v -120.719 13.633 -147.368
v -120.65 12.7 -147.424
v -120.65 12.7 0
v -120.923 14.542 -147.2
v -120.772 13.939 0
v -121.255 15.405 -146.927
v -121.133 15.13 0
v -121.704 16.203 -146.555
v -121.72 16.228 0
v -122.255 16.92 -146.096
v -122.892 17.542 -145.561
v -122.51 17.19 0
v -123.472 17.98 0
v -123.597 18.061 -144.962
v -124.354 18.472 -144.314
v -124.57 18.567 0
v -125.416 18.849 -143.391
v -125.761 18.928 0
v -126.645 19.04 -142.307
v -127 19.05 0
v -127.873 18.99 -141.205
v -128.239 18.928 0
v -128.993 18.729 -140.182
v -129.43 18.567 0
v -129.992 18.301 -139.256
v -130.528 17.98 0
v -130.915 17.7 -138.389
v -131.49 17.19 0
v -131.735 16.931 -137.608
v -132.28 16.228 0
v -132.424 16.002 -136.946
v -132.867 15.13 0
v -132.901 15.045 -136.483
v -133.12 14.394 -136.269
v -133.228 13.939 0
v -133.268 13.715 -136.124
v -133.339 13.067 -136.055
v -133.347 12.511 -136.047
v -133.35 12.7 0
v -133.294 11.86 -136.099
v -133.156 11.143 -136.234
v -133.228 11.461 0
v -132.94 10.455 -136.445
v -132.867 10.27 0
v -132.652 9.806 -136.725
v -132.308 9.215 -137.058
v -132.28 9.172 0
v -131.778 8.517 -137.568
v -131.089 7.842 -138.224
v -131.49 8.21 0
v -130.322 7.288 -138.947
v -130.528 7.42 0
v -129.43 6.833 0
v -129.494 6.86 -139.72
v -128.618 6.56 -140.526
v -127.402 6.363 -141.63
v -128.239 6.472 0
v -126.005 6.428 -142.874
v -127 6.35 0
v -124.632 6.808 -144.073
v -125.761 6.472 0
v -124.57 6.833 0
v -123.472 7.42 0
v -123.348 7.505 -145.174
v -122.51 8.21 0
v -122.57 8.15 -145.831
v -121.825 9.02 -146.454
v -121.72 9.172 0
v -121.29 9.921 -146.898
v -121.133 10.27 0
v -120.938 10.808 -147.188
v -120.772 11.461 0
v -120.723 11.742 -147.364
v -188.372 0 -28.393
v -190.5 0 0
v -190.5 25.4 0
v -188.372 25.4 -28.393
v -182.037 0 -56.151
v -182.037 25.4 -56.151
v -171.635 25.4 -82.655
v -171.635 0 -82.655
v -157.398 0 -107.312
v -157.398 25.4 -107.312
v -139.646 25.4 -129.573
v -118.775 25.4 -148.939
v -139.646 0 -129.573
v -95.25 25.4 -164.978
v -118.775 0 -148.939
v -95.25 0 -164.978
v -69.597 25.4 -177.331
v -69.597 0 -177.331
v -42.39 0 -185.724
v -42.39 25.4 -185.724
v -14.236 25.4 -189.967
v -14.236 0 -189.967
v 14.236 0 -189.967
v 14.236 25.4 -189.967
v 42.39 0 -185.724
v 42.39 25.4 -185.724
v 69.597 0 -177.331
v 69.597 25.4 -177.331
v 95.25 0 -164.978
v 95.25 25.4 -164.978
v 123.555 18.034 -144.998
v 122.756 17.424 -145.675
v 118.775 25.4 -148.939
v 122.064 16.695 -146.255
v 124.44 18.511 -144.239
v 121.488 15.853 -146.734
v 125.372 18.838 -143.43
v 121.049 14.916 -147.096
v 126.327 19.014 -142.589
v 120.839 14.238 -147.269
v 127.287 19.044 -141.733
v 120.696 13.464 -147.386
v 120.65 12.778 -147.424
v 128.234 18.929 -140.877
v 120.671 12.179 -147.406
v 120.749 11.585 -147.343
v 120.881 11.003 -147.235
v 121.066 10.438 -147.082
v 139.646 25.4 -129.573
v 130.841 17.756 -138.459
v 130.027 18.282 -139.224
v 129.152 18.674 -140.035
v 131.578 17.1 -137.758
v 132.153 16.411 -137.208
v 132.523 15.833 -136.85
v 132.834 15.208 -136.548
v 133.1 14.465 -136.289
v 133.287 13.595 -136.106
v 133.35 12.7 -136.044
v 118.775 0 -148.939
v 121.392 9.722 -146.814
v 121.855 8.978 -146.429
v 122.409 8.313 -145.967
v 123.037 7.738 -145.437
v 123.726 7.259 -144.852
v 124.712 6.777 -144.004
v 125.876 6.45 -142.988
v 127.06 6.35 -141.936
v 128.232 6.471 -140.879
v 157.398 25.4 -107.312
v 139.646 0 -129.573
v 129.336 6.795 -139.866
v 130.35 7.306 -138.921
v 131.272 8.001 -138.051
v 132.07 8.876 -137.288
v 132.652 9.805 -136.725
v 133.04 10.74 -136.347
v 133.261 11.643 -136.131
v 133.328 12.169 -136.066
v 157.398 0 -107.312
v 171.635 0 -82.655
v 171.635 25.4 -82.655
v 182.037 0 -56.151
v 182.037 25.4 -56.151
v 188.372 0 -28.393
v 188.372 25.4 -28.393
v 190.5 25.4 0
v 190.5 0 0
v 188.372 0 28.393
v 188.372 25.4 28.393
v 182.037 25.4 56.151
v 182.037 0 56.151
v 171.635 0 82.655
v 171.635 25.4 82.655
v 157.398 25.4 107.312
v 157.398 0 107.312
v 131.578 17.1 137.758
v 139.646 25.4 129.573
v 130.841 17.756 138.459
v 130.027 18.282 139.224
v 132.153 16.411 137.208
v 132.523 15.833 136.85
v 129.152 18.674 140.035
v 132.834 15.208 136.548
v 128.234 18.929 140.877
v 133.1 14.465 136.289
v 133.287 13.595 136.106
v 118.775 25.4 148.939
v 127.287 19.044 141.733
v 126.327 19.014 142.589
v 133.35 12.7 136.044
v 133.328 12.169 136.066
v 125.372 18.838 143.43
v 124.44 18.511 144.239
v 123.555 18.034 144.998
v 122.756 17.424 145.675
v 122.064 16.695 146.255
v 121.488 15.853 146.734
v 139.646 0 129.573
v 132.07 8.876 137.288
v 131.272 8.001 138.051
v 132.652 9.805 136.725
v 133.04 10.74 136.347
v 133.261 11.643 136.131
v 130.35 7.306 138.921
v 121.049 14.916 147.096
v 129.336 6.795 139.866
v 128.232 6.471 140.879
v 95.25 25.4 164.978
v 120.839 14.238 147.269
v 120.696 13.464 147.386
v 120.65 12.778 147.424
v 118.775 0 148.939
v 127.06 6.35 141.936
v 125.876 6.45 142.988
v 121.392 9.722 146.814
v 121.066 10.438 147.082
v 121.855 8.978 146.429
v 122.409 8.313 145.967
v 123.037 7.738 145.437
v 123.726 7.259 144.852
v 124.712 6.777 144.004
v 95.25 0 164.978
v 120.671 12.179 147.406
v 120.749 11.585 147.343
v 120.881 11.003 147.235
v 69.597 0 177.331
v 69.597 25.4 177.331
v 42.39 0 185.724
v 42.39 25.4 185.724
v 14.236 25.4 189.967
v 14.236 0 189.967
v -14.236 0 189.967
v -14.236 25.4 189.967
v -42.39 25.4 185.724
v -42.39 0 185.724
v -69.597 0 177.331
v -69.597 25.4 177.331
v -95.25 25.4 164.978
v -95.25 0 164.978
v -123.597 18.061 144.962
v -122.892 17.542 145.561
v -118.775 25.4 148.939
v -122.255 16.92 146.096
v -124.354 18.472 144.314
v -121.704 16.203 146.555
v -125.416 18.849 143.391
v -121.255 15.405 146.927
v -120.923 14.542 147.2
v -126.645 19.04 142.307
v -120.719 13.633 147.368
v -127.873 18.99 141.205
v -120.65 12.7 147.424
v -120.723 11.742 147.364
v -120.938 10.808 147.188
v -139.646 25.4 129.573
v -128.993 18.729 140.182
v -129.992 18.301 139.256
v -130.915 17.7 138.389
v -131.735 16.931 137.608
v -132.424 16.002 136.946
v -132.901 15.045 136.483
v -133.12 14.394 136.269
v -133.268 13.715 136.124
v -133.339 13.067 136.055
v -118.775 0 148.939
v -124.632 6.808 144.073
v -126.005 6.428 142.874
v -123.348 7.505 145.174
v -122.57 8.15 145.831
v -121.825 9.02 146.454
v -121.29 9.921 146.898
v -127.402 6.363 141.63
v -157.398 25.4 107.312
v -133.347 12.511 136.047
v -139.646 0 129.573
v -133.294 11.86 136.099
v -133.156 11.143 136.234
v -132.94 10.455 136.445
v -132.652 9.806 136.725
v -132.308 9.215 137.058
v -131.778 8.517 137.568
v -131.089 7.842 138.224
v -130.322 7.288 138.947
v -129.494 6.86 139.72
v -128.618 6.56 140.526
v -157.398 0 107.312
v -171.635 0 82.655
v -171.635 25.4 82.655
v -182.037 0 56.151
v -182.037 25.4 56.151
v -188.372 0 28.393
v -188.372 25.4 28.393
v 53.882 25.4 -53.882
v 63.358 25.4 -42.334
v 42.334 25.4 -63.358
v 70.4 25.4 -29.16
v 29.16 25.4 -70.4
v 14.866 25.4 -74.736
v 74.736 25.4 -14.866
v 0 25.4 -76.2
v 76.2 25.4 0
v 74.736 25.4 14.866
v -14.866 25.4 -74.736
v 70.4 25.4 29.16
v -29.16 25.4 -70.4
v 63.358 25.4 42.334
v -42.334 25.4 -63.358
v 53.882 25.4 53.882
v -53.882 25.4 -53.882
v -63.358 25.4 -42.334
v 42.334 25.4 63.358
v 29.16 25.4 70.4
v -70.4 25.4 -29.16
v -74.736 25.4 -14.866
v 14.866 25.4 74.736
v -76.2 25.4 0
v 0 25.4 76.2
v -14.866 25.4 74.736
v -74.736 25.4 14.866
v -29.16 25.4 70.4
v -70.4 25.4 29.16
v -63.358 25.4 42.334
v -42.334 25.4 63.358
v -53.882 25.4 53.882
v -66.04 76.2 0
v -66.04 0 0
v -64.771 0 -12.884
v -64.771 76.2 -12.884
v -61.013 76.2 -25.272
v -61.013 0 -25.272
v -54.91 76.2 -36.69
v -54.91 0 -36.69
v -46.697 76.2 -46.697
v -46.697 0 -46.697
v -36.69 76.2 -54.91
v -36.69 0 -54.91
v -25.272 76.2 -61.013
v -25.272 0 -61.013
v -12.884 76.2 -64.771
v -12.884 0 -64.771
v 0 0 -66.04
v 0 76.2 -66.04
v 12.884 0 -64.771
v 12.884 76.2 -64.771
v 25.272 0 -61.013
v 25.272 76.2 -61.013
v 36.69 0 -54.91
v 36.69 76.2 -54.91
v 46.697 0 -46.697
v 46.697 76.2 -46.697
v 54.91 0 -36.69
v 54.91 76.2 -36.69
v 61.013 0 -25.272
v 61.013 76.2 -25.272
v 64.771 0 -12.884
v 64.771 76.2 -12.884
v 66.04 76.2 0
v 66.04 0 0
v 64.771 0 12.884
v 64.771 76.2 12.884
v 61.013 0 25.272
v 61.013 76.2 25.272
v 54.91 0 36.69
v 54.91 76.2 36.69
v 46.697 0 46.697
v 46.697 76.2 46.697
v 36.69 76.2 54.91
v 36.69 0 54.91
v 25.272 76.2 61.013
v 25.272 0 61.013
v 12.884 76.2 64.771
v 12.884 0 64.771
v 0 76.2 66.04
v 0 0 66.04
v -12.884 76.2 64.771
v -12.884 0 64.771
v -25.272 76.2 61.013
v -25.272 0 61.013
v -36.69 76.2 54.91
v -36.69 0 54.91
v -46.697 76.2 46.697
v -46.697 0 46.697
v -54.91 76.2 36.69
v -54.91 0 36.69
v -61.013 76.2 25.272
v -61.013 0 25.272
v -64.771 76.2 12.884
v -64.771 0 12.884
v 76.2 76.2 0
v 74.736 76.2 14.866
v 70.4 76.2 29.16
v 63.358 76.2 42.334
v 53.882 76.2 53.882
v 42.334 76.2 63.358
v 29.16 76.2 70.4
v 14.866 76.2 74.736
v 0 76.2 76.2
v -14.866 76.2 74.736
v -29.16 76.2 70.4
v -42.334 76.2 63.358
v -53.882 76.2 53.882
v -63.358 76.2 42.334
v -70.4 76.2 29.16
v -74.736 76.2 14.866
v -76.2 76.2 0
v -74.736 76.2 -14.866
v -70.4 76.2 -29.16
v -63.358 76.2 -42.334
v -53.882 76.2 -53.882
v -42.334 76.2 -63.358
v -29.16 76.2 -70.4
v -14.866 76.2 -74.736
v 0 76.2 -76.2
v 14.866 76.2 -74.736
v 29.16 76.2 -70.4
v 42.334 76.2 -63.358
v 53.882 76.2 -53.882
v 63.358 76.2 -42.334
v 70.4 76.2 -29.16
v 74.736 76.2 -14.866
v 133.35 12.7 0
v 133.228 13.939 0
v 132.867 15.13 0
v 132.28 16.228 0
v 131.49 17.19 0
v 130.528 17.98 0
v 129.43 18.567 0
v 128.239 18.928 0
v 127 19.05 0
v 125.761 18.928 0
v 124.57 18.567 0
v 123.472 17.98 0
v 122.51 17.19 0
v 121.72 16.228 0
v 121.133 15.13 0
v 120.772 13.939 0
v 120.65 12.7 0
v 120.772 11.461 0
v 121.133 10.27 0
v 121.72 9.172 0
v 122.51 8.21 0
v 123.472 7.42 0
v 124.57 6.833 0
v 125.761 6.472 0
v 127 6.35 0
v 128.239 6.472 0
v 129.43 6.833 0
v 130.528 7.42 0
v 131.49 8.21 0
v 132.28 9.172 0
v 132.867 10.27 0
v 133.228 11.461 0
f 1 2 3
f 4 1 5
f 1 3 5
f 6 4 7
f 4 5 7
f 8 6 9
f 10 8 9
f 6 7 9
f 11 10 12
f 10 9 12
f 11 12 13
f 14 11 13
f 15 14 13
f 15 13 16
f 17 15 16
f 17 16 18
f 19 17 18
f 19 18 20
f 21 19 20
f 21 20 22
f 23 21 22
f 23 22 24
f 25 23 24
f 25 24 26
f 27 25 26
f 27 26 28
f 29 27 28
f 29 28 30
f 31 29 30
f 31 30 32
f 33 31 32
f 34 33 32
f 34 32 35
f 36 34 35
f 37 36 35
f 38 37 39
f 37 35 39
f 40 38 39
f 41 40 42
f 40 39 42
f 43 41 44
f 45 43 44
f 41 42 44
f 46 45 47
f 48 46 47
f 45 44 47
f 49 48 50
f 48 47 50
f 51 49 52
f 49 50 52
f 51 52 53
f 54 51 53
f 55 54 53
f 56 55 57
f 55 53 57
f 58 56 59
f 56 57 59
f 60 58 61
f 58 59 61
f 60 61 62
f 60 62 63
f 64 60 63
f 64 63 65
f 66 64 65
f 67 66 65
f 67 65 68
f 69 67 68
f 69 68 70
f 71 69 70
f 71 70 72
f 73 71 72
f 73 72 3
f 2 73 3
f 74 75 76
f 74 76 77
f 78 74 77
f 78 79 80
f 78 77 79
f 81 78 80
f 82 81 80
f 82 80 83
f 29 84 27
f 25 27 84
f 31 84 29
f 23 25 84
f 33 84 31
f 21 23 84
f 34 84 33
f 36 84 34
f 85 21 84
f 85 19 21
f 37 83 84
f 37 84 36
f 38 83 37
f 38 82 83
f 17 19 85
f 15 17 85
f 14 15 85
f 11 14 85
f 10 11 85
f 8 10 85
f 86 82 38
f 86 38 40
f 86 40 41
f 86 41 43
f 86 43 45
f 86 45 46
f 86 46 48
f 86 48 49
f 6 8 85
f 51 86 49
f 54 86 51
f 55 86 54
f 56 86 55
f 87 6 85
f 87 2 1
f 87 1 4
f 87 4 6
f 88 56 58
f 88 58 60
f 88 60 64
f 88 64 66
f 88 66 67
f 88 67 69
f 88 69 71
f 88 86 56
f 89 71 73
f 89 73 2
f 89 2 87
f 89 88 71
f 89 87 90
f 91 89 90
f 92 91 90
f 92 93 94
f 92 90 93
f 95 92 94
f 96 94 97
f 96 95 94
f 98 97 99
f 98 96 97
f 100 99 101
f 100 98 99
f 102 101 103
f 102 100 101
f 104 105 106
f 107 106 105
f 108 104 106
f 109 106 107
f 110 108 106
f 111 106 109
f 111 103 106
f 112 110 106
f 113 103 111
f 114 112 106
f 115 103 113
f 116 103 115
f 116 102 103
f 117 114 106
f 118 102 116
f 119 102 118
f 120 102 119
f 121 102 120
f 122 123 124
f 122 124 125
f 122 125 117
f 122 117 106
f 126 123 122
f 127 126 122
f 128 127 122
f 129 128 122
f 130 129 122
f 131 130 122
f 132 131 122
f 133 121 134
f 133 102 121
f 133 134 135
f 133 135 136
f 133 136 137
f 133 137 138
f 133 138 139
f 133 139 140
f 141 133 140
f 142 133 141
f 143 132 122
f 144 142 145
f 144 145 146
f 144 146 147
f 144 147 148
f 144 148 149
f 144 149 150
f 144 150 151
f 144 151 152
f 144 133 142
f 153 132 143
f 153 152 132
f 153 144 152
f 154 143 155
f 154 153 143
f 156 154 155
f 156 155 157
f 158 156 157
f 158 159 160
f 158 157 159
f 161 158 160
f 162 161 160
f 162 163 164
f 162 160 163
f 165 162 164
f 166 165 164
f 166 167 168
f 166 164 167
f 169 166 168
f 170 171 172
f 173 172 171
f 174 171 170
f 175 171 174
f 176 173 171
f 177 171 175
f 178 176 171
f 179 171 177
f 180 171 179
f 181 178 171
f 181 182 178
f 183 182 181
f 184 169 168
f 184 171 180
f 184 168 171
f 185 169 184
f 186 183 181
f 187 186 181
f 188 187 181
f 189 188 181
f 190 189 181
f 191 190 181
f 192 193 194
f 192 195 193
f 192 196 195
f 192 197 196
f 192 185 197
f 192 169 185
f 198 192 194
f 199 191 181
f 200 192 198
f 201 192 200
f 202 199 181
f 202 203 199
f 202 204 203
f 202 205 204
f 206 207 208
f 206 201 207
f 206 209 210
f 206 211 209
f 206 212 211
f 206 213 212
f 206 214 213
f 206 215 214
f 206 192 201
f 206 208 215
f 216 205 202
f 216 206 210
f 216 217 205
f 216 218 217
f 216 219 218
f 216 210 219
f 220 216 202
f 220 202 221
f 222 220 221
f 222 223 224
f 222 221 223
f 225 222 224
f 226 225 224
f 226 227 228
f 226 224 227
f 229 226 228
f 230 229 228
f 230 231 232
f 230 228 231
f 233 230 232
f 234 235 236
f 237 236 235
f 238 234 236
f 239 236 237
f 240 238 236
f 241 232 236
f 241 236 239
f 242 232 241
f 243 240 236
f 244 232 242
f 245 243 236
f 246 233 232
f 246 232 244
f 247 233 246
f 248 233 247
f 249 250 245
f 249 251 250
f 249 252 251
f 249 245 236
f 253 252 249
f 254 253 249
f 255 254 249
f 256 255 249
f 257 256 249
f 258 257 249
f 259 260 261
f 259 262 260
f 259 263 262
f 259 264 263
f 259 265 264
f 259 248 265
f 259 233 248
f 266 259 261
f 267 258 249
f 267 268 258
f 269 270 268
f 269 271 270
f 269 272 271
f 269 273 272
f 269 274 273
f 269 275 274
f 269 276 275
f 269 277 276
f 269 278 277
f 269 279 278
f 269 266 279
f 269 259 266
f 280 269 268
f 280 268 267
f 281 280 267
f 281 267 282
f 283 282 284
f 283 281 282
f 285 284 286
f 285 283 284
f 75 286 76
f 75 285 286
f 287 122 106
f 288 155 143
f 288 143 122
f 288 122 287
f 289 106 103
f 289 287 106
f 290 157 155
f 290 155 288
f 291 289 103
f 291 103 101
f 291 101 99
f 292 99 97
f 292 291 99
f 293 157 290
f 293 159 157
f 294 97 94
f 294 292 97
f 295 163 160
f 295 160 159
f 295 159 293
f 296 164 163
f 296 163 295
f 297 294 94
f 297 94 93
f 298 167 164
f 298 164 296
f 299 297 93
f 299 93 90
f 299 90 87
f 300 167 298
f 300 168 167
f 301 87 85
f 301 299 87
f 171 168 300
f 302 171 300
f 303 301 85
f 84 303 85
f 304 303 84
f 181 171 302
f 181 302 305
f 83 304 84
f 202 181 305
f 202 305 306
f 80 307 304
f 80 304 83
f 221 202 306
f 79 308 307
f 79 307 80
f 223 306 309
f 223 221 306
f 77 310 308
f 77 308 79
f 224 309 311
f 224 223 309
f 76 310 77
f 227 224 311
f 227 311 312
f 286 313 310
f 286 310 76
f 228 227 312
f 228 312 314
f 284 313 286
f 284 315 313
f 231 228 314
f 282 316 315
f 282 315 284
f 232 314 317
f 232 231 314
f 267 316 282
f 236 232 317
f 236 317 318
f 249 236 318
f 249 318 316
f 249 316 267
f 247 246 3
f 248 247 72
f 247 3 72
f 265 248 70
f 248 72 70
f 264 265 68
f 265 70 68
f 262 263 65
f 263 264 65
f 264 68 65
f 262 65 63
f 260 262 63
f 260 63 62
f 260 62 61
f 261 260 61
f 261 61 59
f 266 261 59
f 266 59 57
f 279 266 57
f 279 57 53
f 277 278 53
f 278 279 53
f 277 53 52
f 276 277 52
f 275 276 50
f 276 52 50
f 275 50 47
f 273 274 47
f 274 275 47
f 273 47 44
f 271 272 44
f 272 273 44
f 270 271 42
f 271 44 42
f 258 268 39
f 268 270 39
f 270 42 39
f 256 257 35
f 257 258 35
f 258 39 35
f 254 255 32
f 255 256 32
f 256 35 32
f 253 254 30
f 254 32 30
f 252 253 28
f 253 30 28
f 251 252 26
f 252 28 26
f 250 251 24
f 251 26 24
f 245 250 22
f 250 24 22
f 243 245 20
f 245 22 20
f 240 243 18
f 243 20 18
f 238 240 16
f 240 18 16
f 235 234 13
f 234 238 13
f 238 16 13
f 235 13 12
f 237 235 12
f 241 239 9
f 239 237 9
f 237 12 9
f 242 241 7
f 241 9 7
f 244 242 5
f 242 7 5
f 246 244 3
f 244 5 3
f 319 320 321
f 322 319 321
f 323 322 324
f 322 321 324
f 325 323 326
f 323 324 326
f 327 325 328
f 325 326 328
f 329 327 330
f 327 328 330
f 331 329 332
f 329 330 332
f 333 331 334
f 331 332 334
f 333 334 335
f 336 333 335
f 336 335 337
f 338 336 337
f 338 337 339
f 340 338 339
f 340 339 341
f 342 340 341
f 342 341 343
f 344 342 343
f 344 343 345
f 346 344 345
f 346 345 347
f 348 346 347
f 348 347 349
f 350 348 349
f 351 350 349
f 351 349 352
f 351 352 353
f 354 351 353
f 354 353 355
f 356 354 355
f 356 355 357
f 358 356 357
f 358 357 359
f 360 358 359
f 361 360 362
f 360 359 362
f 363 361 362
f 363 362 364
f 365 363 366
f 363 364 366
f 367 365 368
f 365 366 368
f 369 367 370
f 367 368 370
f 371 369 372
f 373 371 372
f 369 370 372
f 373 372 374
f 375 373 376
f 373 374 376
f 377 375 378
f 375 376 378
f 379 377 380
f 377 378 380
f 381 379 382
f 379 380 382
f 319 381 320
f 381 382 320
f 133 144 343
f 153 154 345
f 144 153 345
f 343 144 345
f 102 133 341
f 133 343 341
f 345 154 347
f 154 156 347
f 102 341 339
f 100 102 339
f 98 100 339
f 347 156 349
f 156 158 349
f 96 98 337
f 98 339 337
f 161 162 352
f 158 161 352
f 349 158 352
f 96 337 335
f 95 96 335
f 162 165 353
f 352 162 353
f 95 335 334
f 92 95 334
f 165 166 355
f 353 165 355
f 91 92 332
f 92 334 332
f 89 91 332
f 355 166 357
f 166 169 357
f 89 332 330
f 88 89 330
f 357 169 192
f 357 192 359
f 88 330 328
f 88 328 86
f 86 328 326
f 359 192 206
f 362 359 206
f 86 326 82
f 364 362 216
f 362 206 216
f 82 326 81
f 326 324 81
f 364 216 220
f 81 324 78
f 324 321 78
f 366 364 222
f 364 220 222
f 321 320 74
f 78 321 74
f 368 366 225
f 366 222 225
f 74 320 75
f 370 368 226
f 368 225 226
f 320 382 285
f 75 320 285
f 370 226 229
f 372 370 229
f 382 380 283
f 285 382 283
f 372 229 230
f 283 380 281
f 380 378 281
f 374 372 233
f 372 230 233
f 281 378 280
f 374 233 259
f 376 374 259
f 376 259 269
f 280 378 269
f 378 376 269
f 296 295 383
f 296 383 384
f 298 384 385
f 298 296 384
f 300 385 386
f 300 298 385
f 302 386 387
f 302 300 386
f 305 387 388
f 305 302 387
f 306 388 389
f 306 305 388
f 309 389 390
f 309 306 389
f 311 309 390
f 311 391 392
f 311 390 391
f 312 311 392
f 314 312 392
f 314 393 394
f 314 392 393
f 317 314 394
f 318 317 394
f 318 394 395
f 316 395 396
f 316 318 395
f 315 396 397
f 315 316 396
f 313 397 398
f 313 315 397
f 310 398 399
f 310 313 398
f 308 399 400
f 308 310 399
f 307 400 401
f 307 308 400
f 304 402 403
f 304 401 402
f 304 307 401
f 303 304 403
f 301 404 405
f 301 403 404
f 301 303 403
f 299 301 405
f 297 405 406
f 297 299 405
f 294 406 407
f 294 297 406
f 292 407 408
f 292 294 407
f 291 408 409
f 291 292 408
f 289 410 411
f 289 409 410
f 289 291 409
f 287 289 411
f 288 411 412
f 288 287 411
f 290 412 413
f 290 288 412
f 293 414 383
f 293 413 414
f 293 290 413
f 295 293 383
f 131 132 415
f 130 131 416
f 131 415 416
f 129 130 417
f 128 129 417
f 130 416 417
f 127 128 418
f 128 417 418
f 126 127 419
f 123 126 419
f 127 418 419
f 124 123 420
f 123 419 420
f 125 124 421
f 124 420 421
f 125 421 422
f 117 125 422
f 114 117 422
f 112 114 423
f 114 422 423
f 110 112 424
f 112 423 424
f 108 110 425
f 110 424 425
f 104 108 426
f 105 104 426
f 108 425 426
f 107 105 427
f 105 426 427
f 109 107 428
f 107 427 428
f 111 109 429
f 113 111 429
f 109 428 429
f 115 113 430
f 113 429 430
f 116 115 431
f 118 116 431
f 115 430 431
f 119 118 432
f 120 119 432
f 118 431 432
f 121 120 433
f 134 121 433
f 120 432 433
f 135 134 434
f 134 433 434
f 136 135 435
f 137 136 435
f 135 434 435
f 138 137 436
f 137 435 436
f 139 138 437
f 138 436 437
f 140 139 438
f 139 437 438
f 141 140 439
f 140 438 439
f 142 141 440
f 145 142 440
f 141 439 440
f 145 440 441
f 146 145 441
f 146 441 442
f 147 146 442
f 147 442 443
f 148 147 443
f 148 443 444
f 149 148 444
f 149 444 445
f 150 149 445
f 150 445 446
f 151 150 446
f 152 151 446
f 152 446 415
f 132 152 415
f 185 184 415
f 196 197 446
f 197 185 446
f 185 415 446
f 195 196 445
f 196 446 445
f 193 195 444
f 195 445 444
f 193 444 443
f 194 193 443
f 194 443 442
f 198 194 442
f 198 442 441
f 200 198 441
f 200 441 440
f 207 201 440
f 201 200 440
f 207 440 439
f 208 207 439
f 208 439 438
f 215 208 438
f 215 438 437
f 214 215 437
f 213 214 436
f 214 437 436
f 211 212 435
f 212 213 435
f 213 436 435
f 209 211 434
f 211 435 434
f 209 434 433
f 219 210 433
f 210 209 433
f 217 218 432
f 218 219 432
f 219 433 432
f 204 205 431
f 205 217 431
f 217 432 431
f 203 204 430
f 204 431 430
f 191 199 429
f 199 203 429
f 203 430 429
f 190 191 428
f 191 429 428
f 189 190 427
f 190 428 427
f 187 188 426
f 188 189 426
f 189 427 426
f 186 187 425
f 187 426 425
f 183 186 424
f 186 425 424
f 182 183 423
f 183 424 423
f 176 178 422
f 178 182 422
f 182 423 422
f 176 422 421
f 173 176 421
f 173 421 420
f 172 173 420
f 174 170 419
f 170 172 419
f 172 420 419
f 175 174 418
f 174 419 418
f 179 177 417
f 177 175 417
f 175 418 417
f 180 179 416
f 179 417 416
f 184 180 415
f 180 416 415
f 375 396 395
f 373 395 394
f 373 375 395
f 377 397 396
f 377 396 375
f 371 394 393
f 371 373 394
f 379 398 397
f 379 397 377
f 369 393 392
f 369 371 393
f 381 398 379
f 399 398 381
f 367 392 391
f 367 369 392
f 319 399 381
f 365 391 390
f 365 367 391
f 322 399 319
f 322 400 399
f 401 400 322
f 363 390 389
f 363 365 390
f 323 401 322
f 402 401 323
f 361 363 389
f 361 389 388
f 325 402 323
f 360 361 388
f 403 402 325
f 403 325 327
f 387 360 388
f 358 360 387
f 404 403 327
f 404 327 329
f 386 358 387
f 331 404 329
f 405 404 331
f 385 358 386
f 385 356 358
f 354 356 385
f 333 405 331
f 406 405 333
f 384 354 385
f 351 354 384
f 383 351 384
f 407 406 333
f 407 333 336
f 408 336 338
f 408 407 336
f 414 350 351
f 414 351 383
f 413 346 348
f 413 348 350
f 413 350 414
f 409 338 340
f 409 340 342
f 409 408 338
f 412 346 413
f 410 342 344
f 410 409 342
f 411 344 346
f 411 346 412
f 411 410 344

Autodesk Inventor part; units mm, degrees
ref_plane "YZ Plane" through (0, 0, 0) normal (1, 0, 0) x (0, 1, 0)
ref_plane "XZ Plane" through (0, 0, 0) normal (0, 1, 0) x (-1, 0, 0)
ref_plane "XY Plane" through (0, 0, 0) normal (0, 0, 1) x (1, 0, 0)
sketch "Sketch1" plane through (0, 0, 0) normal (0, 1, 0) x (-1, 0, 0)
  circle A0 centre (0, 0) radius 190.5
  dimension "d0" = 381
extrude "Extrusion1" add sketch "Sketch1" along normal blind 25.4
sketch "Sketch2" plane through (0, 25.4, 0) normal (0, 1, 0) x (1, 0, 0)
  circle A0 centre (0, 0) radius 76.2
  dimension "d3" = 152.4
extrude "Extrusion2" add sketch "Sketch2" along normal blind 50.8
sketch "Sketch3" plane through (0, 0, 0) normal (0, 1, 0) x (-1, 0, 0)
  circle A0 centre (0, 0) radius 66.04
  dimension "d6" = 132.08
extrude "Extrusion3" cut sketch "Sketch3" along normal up to next
sketch "Sketch10" plane through (0, 0, 0) normal (0, 0, 1) x (1, 0, 0)
  line L0 (25.4, 12.7) -> (-25.4, 12.7) projected
  circle A0 centre (127, 12.7) radius 6.35
  circle A1 centre (-127, 12.7) radius 6.35
  point P0 (0, 0)
  dimension "d37" = 12.7
  dimension "d38" = 12.7
  dimension "d41" = 254
extrude "Extrusion10" cut sketch "Sketch10" along normal mid plane 508
properties part number "Top1"
